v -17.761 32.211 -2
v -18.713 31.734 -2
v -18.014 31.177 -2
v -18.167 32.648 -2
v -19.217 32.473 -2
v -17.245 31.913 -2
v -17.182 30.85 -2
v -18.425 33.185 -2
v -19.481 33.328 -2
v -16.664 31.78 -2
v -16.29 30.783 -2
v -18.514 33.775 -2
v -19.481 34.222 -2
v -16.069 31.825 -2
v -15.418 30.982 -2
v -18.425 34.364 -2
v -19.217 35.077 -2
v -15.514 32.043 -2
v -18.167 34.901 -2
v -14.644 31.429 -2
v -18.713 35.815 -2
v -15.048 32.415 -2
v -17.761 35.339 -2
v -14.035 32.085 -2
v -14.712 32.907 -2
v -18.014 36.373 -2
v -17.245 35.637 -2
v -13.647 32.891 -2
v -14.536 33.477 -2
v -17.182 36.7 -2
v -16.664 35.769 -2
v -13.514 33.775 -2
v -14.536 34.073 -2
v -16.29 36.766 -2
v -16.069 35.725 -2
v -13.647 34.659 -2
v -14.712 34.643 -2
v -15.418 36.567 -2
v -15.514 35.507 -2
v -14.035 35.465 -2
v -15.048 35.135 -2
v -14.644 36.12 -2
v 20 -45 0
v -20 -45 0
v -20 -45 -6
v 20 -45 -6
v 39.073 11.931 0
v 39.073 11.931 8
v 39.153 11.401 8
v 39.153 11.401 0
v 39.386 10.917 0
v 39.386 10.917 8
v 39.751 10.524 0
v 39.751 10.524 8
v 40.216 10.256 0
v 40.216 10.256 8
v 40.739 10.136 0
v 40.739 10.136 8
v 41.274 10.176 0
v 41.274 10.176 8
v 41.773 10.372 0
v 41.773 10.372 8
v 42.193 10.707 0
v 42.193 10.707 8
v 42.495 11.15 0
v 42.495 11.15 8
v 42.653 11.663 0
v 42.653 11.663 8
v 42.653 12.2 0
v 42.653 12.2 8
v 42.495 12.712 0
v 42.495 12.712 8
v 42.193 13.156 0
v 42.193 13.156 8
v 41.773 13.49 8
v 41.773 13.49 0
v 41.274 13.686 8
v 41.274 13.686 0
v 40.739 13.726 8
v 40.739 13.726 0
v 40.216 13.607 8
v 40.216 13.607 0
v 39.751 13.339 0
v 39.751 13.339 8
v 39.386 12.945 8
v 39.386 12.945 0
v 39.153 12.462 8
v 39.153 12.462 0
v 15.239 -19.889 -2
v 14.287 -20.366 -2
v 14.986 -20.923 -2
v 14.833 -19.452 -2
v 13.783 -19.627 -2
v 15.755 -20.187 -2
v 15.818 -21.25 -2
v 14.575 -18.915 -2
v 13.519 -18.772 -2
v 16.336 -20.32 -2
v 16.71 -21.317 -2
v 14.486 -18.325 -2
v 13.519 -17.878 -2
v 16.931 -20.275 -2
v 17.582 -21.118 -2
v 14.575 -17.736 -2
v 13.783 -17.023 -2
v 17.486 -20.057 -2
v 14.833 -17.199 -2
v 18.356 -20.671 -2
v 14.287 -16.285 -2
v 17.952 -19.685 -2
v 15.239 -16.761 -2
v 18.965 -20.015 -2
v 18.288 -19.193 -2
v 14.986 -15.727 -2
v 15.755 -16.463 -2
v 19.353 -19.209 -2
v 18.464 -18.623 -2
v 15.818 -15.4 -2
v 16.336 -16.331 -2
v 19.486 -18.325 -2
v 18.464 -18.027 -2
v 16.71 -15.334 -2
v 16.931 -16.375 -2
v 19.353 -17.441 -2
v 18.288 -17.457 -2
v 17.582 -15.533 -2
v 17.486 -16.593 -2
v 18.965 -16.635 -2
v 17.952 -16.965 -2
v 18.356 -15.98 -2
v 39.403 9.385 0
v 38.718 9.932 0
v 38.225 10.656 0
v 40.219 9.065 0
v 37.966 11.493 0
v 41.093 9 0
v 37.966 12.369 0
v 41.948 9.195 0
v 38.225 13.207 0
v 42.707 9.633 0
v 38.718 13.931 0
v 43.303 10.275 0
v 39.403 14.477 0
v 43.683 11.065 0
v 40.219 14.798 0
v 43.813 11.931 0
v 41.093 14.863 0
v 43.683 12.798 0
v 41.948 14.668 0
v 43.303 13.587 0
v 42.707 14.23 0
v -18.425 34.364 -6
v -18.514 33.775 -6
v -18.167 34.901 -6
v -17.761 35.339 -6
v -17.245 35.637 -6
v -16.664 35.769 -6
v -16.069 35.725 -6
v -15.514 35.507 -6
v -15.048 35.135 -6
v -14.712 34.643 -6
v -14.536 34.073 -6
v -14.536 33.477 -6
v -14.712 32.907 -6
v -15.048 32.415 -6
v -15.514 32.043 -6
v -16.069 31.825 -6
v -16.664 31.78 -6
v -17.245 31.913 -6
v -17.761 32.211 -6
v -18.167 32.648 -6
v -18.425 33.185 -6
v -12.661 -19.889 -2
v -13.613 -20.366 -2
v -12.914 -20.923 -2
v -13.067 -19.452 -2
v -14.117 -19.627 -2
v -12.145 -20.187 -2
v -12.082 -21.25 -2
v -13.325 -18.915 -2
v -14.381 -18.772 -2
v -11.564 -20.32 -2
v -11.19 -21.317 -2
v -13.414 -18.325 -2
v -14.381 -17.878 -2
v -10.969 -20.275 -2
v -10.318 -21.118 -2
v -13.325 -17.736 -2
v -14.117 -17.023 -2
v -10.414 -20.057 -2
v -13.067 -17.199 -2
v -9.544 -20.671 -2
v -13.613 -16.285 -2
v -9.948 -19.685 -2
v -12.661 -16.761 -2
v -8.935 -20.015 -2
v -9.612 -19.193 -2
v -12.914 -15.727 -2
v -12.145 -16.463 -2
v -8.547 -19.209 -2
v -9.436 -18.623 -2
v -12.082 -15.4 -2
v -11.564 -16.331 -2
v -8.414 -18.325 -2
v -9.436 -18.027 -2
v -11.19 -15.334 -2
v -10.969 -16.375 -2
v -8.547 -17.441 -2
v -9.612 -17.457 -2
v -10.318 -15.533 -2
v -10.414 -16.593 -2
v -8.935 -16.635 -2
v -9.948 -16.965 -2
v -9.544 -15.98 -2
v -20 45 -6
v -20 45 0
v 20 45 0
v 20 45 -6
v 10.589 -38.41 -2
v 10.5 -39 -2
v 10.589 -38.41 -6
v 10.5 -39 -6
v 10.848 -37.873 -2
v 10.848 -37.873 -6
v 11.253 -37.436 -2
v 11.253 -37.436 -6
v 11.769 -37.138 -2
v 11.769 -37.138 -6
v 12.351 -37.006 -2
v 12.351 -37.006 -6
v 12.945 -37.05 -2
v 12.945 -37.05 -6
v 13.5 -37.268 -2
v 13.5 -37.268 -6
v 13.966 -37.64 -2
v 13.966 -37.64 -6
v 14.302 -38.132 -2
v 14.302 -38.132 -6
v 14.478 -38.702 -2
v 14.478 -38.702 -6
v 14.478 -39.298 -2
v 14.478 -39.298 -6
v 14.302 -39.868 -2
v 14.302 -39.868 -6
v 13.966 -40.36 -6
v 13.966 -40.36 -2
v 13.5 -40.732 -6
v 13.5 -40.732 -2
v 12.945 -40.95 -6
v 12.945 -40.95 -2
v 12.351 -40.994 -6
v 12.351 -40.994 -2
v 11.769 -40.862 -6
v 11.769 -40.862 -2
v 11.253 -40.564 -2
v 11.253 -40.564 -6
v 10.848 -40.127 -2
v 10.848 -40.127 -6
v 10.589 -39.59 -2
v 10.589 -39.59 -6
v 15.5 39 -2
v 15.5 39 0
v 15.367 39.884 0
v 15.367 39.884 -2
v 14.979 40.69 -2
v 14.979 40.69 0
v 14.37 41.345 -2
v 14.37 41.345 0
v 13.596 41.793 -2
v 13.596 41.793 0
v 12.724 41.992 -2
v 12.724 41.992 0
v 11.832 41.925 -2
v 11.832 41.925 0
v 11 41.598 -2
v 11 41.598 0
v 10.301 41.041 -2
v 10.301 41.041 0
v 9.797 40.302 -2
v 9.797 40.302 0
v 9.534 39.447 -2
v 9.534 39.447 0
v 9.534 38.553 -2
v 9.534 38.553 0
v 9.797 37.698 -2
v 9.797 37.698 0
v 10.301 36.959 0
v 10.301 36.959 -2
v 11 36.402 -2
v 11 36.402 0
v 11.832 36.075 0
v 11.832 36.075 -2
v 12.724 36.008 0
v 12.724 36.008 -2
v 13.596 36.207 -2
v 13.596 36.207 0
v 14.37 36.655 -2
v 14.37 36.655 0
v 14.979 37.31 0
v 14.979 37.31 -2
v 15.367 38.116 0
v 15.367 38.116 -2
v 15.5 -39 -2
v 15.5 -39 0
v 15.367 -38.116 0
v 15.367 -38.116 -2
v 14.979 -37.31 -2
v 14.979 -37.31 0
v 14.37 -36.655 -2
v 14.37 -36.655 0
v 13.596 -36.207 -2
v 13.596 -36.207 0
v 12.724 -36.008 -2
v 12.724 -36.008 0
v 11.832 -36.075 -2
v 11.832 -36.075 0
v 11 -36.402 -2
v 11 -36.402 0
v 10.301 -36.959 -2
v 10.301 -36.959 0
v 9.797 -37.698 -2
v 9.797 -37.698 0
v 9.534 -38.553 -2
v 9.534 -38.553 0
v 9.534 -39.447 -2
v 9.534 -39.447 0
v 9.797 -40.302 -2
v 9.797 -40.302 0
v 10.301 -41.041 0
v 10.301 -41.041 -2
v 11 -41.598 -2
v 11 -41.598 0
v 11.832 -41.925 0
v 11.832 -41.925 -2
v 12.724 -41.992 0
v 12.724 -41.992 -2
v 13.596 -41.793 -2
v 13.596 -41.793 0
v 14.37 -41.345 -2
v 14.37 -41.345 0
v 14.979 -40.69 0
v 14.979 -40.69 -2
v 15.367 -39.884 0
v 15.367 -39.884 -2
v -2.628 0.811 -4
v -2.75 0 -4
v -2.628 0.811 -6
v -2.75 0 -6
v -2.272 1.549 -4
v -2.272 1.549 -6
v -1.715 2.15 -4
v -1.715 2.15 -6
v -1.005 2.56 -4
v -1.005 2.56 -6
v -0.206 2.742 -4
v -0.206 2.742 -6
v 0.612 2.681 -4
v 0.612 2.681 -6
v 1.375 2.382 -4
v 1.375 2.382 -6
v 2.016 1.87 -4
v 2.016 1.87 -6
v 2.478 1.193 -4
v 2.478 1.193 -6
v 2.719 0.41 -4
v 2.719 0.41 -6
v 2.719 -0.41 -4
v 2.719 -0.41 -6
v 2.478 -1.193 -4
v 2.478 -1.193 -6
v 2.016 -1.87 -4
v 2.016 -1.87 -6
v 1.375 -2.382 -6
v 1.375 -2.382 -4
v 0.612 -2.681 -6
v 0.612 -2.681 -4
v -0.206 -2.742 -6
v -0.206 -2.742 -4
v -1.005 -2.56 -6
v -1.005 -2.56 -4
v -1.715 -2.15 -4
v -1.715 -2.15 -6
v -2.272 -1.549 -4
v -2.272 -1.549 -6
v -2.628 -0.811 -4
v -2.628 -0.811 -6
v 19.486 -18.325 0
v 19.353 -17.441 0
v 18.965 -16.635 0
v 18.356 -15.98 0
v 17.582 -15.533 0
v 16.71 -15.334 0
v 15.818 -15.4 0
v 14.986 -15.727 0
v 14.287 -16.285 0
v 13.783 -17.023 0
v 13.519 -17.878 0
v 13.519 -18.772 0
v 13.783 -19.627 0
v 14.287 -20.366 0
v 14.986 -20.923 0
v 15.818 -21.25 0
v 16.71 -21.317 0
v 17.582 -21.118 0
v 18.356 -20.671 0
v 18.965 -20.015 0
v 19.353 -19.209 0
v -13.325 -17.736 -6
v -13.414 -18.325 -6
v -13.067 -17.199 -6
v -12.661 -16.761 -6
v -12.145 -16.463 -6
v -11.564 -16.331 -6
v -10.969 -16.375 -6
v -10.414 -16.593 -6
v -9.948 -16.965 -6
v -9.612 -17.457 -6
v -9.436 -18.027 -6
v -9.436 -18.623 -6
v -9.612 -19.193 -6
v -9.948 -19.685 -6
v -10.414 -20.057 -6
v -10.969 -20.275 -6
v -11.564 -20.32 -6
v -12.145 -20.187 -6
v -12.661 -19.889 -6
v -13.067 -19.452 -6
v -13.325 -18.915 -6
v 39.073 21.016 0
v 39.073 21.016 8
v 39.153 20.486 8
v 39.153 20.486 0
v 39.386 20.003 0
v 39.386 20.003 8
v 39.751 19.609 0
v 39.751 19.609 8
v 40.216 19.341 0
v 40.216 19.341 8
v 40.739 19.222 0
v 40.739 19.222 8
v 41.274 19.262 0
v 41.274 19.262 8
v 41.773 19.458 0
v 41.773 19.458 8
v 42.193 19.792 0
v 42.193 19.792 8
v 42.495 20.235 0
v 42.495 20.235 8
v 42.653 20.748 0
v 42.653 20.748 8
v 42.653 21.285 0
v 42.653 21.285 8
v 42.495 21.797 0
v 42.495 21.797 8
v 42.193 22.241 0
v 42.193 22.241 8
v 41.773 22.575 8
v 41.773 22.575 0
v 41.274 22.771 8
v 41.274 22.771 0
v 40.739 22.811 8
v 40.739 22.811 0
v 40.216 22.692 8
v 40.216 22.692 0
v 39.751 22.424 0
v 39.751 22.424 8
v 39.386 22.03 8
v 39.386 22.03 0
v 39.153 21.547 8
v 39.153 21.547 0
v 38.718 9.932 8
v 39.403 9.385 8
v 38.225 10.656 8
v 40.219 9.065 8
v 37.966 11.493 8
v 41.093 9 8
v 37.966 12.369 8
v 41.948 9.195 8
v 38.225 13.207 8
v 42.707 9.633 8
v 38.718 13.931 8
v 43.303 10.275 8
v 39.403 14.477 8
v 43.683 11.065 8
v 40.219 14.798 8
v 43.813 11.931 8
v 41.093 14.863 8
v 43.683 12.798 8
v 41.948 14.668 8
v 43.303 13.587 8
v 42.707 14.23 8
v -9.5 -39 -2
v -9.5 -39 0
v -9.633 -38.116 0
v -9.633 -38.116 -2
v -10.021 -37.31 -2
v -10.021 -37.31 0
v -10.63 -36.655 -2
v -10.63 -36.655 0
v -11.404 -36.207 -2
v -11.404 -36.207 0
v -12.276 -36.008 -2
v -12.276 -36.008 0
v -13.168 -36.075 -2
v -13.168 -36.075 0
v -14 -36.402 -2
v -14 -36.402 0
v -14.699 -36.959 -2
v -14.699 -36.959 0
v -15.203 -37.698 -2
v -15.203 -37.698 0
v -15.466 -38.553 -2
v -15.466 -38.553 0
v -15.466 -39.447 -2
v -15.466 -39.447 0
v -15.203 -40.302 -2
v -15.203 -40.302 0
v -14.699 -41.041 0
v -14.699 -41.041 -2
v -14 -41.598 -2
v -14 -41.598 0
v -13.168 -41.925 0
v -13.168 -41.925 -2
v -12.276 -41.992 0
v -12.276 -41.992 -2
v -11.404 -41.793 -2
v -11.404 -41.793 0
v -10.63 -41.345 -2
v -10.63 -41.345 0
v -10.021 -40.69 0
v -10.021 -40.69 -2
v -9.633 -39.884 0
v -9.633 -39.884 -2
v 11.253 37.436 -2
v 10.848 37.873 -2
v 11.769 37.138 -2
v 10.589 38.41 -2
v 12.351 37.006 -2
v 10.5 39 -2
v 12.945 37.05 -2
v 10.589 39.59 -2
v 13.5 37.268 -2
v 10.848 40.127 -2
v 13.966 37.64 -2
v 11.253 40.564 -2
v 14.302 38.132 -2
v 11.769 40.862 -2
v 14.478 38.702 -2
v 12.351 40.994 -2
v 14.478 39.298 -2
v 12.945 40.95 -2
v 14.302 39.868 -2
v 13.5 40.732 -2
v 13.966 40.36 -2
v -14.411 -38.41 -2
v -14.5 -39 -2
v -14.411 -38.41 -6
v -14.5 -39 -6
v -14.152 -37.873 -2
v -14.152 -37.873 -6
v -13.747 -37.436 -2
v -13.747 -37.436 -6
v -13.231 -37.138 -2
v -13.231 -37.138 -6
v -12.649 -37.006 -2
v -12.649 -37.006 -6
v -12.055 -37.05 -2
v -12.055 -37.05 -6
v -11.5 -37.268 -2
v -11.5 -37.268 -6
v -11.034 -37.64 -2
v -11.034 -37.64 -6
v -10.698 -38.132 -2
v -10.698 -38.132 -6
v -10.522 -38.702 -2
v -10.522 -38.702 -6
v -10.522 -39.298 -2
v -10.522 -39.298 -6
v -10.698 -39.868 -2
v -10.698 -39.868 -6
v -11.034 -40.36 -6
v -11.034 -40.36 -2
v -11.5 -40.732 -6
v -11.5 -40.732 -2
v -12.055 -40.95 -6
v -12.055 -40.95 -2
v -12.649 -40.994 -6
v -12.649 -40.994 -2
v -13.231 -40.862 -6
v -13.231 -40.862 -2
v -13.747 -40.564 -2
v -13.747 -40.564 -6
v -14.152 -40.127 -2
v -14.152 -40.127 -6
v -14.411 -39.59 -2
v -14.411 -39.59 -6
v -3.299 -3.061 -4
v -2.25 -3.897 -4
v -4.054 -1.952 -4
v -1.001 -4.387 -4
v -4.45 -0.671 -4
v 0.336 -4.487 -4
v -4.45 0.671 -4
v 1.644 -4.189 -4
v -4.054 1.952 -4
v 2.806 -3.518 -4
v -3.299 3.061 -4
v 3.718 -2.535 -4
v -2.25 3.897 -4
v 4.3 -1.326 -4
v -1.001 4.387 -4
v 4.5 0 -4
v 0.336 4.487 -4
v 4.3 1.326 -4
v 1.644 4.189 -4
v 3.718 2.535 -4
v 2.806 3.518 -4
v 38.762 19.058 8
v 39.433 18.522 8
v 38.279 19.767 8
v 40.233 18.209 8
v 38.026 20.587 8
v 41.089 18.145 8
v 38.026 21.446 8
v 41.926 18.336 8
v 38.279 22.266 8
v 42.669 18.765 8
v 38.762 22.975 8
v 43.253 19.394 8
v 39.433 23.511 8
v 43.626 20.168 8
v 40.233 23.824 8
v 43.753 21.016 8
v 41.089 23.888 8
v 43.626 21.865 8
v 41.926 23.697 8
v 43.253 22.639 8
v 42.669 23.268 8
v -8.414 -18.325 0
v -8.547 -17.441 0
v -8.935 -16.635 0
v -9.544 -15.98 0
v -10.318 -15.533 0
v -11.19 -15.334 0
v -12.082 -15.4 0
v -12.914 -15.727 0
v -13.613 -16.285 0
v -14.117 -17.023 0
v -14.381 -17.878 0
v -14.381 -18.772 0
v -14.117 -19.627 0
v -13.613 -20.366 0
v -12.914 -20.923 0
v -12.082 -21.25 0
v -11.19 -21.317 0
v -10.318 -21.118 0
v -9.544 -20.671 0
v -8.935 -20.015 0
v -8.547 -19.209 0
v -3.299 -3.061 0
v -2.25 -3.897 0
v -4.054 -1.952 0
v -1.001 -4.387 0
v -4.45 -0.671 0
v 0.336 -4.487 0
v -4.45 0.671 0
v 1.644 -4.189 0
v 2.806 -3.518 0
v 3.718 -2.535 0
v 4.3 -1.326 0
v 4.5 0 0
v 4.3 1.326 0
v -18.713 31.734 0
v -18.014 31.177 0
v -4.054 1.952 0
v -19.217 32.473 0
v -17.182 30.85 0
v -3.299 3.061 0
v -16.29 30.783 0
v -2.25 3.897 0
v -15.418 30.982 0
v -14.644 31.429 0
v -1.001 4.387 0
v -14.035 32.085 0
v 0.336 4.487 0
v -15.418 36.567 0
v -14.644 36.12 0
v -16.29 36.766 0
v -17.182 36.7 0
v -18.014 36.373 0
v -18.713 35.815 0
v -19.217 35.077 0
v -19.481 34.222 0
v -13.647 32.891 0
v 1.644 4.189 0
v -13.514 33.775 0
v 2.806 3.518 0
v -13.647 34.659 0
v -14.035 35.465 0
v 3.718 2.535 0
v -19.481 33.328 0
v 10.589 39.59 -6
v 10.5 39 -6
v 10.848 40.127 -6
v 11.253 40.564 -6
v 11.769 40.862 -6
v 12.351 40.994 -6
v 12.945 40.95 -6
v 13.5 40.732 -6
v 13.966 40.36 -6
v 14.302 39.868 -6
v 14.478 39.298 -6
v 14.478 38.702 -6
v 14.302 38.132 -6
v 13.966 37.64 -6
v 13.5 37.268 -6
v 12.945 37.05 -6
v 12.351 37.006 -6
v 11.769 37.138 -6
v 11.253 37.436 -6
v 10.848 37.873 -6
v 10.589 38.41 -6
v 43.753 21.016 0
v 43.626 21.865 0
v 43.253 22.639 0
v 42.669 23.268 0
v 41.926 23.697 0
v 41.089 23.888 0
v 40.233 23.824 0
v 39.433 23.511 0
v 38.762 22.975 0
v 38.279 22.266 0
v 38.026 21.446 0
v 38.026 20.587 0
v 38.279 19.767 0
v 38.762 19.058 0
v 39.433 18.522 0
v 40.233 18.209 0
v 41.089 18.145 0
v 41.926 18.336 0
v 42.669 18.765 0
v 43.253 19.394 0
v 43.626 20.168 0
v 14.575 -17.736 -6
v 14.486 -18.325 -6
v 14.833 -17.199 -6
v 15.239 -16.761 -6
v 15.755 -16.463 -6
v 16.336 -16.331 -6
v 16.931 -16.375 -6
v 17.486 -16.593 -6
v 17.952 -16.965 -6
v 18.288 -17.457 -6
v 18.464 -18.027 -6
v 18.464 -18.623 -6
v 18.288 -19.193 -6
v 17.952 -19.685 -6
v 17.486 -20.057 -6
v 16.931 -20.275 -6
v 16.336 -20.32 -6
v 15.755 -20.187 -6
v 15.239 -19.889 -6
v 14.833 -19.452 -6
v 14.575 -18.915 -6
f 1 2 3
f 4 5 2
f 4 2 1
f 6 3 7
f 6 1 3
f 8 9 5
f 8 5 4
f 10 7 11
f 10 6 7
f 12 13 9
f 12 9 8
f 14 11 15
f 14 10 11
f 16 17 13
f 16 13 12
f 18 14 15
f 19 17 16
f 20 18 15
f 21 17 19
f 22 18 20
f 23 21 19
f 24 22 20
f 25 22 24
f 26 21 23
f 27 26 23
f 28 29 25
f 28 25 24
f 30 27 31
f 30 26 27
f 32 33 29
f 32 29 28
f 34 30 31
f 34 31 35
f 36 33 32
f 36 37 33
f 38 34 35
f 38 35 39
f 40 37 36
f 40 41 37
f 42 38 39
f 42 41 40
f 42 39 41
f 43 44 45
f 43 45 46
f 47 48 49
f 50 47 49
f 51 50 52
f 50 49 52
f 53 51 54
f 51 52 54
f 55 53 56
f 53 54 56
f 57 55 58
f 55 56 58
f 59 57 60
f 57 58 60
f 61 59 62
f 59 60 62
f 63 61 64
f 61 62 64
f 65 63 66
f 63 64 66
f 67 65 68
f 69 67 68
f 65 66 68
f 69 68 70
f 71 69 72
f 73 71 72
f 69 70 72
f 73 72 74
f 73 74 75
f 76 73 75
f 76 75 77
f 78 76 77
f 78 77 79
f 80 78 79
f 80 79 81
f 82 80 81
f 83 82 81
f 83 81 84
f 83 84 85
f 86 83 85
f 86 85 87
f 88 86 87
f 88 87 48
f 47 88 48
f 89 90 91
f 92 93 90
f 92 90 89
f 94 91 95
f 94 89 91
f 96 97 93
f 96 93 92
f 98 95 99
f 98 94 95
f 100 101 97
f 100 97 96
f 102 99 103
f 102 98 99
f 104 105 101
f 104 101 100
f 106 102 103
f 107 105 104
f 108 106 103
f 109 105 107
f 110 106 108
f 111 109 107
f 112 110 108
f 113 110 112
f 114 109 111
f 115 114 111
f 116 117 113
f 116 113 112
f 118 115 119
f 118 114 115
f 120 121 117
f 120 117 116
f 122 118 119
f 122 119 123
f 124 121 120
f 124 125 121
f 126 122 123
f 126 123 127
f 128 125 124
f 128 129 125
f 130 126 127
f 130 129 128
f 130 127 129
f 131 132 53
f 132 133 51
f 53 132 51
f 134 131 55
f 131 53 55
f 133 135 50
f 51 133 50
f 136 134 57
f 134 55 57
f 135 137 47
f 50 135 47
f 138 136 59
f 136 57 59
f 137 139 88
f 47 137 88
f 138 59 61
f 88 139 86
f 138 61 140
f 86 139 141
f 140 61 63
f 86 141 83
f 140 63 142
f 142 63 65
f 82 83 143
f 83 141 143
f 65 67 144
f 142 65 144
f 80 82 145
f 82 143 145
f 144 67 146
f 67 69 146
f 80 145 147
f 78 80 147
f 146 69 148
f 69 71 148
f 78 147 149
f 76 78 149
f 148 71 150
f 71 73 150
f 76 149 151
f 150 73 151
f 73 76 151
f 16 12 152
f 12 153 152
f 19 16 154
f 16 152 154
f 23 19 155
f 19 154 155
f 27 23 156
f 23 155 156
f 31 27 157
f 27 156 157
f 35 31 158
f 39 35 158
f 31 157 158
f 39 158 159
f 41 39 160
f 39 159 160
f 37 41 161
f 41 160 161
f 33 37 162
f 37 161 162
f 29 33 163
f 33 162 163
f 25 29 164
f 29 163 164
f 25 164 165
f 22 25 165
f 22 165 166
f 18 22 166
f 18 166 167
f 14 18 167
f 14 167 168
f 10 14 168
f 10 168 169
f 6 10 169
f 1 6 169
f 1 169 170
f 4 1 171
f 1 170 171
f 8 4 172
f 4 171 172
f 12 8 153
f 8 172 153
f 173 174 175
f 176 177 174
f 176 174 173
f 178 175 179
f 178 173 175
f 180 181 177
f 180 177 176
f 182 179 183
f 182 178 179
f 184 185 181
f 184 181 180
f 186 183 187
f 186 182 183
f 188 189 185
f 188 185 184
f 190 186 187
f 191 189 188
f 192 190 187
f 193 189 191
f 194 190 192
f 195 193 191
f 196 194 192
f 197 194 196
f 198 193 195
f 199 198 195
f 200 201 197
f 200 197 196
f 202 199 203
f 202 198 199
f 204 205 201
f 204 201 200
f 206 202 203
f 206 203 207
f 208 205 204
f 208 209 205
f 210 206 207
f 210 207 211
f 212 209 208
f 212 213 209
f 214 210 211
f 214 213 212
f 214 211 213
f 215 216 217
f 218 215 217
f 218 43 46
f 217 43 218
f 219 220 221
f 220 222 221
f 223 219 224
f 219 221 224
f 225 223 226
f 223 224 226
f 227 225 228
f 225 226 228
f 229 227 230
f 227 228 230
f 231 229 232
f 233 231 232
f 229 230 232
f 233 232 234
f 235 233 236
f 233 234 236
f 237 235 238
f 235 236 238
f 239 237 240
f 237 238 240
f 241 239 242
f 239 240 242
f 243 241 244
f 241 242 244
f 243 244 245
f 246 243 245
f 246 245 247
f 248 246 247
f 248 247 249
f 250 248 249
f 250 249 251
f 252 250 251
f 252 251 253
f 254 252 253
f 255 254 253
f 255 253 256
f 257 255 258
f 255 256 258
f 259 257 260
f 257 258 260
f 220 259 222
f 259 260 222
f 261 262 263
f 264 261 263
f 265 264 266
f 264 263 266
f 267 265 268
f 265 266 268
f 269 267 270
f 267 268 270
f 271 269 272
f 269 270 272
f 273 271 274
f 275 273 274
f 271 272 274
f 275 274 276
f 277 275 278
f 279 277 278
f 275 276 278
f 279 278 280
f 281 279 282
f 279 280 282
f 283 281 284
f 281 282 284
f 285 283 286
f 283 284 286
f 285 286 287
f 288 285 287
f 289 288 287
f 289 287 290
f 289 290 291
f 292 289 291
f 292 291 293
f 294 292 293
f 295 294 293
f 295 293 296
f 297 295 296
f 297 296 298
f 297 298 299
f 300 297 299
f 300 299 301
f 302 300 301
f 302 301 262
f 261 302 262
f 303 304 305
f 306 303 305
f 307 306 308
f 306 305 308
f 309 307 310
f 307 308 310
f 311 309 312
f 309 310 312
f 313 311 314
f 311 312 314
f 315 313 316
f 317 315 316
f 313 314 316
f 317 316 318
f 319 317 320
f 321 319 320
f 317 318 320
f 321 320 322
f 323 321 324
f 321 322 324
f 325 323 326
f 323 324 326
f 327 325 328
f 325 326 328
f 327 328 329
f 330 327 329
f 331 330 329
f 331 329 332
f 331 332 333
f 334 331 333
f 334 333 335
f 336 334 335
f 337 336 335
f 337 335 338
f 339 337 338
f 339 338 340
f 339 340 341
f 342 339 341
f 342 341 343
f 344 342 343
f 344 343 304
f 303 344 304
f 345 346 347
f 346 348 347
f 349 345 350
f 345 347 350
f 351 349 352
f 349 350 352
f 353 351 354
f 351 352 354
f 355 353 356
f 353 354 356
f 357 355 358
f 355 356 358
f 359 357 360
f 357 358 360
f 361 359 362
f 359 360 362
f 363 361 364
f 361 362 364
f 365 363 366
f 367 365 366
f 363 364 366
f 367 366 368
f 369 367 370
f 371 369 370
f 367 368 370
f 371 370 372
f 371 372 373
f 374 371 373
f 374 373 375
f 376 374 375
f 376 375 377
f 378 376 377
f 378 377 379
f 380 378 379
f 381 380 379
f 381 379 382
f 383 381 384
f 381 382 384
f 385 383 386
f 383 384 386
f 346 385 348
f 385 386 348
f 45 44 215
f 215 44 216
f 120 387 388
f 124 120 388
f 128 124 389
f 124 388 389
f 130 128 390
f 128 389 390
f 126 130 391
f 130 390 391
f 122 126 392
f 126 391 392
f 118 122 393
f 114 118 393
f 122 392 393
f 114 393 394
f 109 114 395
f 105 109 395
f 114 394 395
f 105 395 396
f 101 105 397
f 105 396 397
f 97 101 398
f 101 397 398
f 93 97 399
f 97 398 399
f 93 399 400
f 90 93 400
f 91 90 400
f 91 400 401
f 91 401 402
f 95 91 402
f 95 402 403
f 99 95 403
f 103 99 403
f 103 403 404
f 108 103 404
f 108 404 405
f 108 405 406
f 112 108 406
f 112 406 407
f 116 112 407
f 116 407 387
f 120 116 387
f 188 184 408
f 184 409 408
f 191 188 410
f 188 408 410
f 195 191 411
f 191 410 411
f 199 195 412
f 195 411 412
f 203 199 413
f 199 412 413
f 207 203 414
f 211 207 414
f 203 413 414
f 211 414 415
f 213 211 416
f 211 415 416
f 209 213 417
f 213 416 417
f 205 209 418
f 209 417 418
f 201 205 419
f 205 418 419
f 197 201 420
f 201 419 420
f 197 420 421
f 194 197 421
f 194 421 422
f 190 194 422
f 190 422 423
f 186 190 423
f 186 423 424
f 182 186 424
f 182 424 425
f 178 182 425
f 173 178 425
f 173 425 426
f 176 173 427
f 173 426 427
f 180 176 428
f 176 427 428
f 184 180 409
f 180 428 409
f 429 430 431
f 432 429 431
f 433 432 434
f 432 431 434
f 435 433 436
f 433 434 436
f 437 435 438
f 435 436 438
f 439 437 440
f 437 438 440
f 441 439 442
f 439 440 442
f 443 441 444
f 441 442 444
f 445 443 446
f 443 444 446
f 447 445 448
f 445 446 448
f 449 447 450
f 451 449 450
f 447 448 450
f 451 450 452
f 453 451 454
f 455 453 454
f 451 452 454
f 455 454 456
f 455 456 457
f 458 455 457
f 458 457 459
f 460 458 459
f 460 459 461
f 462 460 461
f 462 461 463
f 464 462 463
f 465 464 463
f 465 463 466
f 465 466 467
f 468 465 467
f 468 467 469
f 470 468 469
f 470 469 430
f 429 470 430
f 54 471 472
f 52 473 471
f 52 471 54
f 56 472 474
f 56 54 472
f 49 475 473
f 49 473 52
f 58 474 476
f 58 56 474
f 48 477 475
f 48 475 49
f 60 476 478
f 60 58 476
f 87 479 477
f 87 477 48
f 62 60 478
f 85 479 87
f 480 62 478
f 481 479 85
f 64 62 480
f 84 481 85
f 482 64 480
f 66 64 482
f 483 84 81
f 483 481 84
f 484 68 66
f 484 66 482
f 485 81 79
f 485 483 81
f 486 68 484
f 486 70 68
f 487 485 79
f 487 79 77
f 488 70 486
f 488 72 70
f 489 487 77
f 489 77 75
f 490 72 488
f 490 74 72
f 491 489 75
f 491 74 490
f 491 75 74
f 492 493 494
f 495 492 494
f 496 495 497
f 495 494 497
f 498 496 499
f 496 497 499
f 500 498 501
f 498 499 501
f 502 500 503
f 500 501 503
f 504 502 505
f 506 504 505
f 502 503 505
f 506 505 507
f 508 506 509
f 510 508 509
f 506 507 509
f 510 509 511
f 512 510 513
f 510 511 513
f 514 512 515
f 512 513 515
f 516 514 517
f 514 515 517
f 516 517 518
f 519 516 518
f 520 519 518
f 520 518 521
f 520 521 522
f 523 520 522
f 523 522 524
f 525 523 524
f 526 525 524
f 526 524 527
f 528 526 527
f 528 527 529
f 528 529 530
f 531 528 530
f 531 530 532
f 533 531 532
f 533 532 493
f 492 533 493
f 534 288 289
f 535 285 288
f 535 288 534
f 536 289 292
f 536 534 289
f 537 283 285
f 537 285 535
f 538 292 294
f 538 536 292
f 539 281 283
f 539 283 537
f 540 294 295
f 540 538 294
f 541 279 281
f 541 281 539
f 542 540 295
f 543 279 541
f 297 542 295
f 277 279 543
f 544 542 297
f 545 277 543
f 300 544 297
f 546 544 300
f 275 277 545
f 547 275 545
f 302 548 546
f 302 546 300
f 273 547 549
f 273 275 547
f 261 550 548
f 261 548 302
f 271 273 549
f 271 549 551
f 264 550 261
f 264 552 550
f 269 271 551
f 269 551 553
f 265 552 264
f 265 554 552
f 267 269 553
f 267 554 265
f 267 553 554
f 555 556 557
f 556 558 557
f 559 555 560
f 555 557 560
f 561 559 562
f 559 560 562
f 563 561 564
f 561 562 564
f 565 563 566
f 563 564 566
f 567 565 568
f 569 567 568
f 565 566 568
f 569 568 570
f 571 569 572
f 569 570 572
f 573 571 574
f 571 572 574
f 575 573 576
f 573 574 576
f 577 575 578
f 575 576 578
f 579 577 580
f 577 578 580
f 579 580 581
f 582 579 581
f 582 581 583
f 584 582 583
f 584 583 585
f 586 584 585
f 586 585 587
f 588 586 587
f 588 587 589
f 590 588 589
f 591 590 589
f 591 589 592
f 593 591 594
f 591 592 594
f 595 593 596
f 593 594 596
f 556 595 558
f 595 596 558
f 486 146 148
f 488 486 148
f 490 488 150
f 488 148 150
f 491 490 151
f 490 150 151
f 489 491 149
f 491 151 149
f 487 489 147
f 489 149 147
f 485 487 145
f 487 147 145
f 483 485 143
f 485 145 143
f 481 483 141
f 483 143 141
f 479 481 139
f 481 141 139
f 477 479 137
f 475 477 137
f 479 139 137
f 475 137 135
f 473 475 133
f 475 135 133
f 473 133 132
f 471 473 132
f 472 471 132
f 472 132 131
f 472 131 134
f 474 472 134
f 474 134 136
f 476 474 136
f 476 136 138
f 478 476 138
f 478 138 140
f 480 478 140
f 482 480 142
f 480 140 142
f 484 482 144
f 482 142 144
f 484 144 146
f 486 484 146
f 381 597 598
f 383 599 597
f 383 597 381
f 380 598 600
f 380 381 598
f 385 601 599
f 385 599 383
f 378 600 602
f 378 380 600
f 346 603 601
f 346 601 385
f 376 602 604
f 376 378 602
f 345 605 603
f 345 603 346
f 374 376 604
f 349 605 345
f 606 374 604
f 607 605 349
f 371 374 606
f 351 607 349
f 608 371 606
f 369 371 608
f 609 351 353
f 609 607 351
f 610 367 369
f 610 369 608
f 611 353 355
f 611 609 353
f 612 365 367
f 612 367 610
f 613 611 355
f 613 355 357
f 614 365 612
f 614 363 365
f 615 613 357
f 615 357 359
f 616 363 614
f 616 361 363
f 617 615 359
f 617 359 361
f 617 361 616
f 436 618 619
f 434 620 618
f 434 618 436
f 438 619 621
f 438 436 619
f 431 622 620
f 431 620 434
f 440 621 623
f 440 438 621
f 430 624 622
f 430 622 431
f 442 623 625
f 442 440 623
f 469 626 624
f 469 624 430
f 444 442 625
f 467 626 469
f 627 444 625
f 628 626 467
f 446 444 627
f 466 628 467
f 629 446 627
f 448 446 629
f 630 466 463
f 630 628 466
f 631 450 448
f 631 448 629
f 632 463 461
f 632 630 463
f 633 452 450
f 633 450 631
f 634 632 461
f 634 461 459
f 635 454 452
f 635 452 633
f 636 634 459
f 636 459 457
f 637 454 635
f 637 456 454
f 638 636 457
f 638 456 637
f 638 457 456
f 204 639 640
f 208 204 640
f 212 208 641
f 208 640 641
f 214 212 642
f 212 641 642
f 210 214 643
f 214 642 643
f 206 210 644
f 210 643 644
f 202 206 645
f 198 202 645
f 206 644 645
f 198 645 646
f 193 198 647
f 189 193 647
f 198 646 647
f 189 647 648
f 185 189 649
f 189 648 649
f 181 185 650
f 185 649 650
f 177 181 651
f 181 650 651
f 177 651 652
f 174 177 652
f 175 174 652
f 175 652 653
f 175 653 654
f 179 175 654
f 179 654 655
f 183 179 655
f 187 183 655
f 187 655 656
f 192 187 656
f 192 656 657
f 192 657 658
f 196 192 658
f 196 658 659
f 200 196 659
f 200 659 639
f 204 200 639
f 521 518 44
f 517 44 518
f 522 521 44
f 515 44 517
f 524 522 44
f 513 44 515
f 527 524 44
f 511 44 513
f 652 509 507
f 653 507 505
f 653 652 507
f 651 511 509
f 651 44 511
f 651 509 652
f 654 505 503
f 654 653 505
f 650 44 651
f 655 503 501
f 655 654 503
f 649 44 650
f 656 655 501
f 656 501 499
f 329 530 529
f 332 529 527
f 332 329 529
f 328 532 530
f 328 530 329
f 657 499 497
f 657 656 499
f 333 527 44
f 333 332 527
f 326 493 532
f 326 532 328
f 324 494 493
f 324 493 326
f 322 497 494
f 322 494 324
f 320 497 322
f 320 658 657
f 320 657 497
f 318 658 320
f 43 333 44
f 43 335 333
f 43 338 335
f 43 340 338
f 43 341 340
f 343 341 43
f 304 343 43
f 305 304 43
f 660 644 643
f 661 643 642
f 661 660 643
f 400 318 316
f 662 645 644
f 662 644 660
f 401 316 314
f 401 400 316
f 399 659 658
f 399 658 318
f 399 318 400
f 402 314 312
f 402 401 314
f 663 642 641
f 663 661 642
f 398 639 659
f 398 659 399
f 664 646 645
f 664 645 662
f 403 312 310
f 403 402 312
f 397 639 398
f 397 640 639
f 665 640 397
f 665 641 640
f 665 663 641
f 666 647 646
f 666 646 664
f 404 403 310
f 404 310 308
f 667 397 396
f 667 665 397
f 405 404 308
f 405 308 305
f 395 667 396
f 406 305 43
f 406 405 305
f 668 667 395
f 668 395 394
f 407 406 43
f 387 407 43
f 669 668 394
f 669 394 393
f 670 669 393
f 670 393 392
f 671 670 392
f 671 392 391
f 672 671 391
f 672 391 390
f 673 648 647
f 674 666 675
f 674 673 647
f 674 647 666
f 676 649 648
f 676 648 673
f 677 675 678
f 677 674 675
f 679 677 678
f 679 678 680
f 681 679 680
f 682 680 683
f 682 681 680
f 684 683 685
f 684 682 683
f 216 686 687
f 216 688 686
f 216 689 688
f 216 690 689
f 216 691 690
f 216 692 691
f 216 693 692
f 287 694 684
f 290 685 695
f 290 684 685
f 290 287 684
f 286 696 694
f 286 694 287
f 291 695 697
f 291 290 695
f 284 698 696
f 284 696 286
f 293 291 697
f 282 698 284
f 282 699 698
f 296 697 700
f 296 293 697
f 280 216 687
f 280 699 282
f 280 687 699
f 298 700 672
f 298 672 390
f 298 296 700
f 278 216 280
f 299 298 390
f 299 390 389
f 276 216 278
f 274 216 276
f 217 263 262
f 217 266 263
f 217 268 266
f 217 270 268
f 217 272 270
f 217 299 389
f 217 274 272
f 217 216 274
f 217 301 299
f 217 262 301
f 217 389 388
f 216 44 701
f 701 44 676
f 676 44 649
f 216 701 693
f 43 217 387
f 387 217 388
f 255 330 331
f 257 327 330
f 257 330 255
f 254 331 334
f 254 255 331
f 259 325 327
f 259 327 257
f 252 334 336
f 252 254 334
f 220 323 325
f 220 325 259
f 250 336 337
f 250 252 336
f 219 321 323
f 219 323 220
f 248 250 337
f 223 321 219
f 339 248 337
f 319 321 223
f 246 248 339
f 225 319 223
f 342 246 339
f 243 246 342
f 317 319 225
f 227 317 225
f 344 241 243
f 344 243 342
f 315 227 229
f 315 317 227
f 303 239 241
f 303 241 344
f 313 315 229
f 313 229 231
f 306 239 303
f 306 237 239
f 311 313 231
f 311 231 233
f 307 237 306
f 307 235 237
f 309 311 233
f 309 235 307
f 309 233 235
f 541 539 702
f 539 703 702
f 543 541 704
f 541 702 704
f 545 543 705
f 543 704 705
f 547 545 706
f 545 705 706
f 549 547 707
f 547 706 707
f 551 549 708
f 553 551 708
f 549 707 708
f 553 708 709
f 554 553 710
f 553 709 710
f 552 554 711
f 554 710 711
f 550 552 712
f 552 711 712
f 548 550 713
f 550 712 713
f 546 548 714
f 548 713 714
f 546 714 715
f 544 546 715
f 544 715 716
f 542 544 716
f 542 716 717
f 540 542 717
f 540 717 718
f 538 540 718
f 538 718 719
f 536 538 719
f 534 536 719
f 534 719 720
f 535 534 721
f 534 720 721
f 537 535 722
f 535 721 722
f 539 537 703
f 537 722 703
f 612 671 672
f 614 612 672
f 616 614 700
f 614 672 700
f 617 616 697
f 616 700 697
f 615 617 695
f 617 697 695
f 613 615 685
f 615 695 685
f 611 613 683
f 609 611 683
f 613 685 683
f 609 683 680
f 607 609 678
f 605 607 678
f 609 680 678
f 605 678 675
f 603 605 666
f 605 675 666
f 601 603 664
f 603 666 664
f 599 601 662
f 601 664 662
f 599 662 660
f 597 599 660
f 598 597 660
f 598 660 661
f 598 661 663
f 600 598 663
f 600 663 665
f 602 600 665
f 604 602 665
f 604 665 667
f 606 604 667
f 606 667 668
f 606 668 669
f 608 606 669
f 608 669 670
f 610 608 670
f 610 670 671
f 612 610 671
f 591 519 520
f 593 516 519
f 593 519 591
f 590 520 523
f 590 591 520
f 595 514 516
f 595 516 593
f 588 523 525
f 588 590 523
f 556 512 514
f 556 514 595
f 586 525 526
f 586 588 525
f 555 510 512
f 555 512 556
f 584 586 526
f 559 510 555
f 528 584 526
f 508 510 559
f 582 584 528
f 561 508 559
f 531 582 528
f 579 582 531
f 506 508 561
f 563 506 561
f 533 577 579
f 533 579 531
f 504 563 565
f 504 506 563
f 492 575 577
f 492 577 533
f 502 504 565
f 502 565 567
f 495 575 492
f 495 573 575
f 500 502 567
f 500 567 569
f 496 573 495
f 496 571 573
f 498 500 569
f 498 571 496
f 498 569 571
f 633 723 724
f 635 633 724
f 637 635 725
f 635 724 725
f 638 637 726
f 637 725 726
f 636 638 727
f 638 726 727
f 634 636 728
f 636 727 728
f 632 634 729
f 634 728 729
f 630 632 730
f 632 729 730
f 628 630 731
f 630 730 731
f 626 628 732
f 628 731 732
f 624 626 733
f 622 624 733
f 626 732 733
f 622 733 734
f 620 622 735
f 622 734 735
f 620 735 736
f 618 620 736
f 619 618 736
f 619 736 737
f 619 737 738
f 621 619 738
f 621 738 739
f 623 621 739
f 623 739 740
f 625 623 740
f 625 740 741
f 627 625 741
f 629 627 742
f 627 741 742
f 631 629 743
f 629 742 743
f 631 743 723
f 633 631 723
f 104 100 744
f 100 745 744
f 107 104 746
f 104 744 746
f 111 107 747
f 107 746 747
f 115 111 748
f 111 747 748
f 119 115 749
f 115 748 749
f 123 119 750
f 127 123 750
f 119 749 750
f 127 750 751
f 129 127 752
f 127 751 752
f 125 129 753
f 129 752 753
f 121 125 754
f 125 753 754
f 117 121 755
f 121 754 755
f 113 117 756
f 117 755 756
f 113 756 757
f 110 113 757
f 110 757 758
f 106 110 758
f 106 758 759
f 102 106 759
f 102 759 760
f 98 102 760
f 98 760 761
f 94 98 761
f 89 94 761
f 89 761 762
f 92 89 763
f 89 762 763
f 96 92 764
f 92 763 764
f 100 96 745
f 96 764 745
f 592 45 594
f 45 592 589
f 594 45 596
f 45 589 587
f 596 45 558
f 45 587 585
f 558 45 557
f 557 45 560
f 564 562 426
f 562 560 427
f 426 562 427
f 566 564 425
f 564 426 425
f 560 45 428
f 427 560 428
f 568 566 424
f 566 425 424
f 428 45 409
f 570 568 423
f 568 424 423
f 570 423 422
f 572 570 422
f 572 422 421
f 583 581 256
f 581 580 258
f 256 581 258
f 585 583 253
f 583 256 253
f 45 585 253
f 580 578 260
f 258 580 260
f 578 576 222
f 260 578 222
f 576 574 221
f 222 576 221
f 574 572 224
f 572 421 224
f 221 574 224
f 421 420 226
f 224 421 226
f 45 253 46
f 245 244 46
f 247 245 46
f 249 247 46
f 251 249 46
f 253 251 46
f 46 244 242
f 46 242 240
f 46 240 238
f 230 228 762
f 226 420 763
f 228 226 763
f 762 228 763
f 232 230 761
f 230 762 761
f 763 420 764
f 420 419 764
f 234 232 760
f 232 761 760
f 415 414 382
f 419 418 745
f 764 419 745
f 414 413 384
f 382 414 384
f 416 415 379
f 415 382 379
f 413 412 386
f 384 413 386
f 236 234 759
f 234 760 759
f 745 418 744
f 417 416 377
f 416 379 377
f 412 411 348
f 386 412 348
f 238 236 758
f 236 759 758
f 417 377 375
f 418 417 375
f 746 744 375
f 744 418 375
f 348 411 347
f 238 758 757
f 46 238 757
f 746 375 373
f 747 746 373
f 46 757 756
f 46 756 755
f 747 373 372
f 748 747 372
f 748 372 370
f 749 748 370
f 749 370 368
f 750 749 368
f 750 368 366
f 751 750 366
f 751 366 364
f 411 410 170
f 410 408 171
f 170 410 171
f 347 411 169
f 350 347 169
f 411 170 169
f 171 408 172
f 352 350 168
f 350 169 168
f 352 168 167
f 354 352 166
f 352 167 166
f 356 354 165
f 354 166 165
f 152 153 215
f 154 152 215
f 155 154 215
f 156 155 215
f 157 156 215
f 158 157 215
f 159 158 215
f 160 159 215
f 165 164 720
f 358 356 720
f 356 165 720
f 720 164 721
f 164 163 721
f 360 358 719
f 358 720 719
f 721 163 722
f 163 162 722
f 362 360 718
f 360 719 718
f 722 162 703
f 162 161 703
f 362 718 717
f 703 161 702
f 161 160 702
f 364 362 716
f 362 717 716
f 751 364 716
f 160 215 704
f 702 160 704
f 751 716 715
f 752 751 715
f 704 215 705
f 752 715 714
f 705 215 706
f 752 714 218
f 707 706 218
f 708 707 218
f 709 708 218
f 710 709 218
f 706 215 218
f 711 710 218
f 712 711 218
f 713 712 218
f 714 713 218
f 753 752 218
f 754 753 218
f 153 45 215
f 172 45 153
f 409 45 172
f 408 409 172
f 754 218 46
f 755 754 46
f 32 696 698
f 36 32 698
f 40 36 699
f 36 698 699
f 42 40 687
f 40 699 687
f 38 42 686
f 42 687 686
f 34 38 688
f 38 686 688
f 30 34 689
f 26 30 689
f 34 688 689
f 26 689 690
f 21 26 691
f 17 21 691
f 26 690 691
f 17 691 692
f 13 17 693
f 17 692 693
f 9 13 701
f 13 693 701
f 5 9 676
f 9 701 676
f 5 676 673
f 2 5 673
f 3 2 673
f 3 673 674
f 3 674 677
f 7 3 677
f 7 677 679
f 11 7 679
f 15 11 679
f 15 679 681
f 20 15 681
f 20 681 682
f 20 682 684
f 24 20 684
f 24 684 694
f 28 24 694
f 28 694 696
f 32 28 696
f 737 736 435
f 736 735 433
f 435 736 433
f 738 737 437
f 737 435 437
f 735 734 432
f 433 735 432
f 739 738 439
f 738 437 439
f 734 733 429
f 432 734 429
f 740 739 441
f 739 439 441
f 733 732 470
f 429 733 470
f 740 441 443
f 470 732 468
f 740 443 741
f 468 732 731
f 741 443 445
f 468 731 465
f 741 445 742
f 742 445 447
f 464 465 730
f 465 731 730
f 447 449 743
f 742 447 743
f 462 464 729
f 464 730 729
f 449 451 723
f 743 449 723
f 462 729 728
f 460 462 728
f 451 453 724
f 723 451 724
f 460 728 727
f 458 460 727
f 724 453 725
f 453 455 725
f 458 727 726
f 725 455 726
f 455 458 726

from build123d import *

# Parameters (mm, degrees)
F2_W                 = 40
F2_H                 = 90
F2_R                 = 15
F5_DEPTH             = 6
F6_D                 = 5.5
F6_DEPTH             = 30
F6_CBORE_D           = 9
F6_CBORE_DEPTH       = 4
F6_TIP               = 1.6523667023
F7_D                 = 4
F7_DEPTH             = 30
F7_CBORE_D           = 6
F7_CBORE_DEPTH       = 2
F7_TIP               = 1.2017212381
F7_ON_F4_D           = 4
F7_ON_F4_DEPTH       = 30
F7_ON_F4_CBORE_D     = 6
F7_ON_F4_CBORE_DEPTH = 2
F7_ON_F4_TIP         = 1.2017212381
F7_ON_F3_D           = 4
F7_ON_F3_DEPTH       = 30
F7_ON_F3_CBORE_D     = 6
F7_ON_F3_CBORE_DEPTH = 2
F7_ON_F3_TIP         = 1.2017212381
F2_R_2               = 2.88
F8_DEPTH             = 8
F2_R_3               = 2.94
F9_D                 = 3.6
F9_DEPTH             = 30
F9_TIP               = 1.0815491142
F9_2_D               = 3.6
F9_2_DEPTH           = 30
F9_2_TIP             = 1.0815491142


# Not quite as in the source:
# - a feature names something its author has since deleted; it is built from what else it names


with BuildPart() as f5:
    # F2 (on Top) → F5 (new body)
    with BuildSketch(Plane.XY):
        Rectangle(F2_W, F2_H)
        Circle(F2_R, mode=Mode.SUBTRACT)
        Circle(F2_R)
    extrude(amount=-F5_DEPTH)

    # F6
    with Locations(Plane.XY):
        with Locations((0, 0)):
            CounterBoreHole(F6_D / 2, F6_CBORE_D / 2, F6_CBORE_DEPTH, depth=F6_DEPTH)
            with Locations((0, 0, -(F6_DEPTH + F6_TIP / 2))):  # 118° drill point
                Cone(0, F6_D / 2, F6_TIP, mode=Mode.SUBTRACT)

    # F7
    with Locations(Plane.XY):
        with Locations((12.5, 39), (-16.5140936151, 33.7748509184), (-11.4140936151, -18.3251490816)):
            CounterBoreHole(F7_D / 2, F7_CBORE_D / 2, F7_CBORE_DEPTH, depth=F7_DEPTH)
            with Locations((0, 0, -(F7_DEPTH + F7_TIP / 2))):  # 118° drill point
                Cone(0, F7_D / 2, F7_TIP, mode=Mode.SUBTRACT)

    # F7 on F4
    with Locations(Plane.XY):
        with Locations((16.4859063849, -18.3251490816)):
            CounterBoreHole(F7_ON_F4_D / 2, F7_ON_F4_CBORE_D / 2, F7_ON_F4_CBORE_DEPTH, depth=F7_ON_F4_DEPTH)
            with Locations((0, 0, -(F7_ON_F4_DEPTH + F7_ON_F4_TIP / 2))):  # 118° drill point
                Cone(0, F7_ON_F4_D / 2, F7_ON_F4_TIP, mode=Mode.SUBTRACT)

    # F7 on F3
    with Locations(Plane.XY):
        with Locations((-12.5, -39), (12.5, -39)):
            CounterBoreHole(F7_ON_F3_D / 2, F7_ON_F3_CBORE_D / 2, F7_ON_F3_CBORE_DEPTH, depth=F7_ON_F3_DEPTH)
            with Locations((0, 0, -(F7_ON_F3_DEPTH + F7_ON_F3_TIP / 2))):  # 118° drill point
                Cone(0, F7_ON_F3_D / 2, F7_ON_F3_TIP, mode=Mode.SUBTRACT)


with BuildPart() as f8:
    # F2 (on Top) → F8 (new body)
    with BuildSketch(Plane.XY):
        with Locations((40.8734753728, 21.0164897144)):
            Circle(F2_R_2)
    extrude(amount=F8_DEPTH)

    # F9
    with Locations(Plane(origin=(0, 0, 0), x_dir=(1, 0, 0), z_dir=(0, 0, -1))):
        with Locations((40.8734753728, -11.9312852621), (40.8734753728, -21.0164897144)):
            Hole(F9_D / 2, depth=F9_DEPTH)
            with Locations((0, 0, -(F9_DEPTH + F9_TIP / 2))):  # 118° drill point
                Cone(0, F9_D / 2, F9_TIP, mode=Mode.SUBTRACT)


with BuildPart() as f8b:
    # F2 (on Top) → F8, piece 2 (new body)
    with BuildSketch(Plane.XY):
        with Locations((40.8734753728, 11.9312852621)):
            Circle(F2_R_3)
    extrude(amount=F8_DEPTH)

    # F9#2
    with Locations(Plane(origin=(0, 0, 0), x_dir=(1, 0, 0), z_dir=(0, 0, -1))):
        with Locations((40.8734753728, -11.9312852621), (40.8734753728, -21.0164897144)):
            Hole(F9_2_D / 2, depth=F9_2_DEPTH)
            with Locations((0, 0, -(F9_2_DEPTH + F9_2_TIP / 2))):  # 118° drill point
                Cone(0, F9_2_D / 2, F9_2_TIP, mode=Mode.SUBTRACT)


solid = Compound([f5.part, f8.part, f8b.part])
